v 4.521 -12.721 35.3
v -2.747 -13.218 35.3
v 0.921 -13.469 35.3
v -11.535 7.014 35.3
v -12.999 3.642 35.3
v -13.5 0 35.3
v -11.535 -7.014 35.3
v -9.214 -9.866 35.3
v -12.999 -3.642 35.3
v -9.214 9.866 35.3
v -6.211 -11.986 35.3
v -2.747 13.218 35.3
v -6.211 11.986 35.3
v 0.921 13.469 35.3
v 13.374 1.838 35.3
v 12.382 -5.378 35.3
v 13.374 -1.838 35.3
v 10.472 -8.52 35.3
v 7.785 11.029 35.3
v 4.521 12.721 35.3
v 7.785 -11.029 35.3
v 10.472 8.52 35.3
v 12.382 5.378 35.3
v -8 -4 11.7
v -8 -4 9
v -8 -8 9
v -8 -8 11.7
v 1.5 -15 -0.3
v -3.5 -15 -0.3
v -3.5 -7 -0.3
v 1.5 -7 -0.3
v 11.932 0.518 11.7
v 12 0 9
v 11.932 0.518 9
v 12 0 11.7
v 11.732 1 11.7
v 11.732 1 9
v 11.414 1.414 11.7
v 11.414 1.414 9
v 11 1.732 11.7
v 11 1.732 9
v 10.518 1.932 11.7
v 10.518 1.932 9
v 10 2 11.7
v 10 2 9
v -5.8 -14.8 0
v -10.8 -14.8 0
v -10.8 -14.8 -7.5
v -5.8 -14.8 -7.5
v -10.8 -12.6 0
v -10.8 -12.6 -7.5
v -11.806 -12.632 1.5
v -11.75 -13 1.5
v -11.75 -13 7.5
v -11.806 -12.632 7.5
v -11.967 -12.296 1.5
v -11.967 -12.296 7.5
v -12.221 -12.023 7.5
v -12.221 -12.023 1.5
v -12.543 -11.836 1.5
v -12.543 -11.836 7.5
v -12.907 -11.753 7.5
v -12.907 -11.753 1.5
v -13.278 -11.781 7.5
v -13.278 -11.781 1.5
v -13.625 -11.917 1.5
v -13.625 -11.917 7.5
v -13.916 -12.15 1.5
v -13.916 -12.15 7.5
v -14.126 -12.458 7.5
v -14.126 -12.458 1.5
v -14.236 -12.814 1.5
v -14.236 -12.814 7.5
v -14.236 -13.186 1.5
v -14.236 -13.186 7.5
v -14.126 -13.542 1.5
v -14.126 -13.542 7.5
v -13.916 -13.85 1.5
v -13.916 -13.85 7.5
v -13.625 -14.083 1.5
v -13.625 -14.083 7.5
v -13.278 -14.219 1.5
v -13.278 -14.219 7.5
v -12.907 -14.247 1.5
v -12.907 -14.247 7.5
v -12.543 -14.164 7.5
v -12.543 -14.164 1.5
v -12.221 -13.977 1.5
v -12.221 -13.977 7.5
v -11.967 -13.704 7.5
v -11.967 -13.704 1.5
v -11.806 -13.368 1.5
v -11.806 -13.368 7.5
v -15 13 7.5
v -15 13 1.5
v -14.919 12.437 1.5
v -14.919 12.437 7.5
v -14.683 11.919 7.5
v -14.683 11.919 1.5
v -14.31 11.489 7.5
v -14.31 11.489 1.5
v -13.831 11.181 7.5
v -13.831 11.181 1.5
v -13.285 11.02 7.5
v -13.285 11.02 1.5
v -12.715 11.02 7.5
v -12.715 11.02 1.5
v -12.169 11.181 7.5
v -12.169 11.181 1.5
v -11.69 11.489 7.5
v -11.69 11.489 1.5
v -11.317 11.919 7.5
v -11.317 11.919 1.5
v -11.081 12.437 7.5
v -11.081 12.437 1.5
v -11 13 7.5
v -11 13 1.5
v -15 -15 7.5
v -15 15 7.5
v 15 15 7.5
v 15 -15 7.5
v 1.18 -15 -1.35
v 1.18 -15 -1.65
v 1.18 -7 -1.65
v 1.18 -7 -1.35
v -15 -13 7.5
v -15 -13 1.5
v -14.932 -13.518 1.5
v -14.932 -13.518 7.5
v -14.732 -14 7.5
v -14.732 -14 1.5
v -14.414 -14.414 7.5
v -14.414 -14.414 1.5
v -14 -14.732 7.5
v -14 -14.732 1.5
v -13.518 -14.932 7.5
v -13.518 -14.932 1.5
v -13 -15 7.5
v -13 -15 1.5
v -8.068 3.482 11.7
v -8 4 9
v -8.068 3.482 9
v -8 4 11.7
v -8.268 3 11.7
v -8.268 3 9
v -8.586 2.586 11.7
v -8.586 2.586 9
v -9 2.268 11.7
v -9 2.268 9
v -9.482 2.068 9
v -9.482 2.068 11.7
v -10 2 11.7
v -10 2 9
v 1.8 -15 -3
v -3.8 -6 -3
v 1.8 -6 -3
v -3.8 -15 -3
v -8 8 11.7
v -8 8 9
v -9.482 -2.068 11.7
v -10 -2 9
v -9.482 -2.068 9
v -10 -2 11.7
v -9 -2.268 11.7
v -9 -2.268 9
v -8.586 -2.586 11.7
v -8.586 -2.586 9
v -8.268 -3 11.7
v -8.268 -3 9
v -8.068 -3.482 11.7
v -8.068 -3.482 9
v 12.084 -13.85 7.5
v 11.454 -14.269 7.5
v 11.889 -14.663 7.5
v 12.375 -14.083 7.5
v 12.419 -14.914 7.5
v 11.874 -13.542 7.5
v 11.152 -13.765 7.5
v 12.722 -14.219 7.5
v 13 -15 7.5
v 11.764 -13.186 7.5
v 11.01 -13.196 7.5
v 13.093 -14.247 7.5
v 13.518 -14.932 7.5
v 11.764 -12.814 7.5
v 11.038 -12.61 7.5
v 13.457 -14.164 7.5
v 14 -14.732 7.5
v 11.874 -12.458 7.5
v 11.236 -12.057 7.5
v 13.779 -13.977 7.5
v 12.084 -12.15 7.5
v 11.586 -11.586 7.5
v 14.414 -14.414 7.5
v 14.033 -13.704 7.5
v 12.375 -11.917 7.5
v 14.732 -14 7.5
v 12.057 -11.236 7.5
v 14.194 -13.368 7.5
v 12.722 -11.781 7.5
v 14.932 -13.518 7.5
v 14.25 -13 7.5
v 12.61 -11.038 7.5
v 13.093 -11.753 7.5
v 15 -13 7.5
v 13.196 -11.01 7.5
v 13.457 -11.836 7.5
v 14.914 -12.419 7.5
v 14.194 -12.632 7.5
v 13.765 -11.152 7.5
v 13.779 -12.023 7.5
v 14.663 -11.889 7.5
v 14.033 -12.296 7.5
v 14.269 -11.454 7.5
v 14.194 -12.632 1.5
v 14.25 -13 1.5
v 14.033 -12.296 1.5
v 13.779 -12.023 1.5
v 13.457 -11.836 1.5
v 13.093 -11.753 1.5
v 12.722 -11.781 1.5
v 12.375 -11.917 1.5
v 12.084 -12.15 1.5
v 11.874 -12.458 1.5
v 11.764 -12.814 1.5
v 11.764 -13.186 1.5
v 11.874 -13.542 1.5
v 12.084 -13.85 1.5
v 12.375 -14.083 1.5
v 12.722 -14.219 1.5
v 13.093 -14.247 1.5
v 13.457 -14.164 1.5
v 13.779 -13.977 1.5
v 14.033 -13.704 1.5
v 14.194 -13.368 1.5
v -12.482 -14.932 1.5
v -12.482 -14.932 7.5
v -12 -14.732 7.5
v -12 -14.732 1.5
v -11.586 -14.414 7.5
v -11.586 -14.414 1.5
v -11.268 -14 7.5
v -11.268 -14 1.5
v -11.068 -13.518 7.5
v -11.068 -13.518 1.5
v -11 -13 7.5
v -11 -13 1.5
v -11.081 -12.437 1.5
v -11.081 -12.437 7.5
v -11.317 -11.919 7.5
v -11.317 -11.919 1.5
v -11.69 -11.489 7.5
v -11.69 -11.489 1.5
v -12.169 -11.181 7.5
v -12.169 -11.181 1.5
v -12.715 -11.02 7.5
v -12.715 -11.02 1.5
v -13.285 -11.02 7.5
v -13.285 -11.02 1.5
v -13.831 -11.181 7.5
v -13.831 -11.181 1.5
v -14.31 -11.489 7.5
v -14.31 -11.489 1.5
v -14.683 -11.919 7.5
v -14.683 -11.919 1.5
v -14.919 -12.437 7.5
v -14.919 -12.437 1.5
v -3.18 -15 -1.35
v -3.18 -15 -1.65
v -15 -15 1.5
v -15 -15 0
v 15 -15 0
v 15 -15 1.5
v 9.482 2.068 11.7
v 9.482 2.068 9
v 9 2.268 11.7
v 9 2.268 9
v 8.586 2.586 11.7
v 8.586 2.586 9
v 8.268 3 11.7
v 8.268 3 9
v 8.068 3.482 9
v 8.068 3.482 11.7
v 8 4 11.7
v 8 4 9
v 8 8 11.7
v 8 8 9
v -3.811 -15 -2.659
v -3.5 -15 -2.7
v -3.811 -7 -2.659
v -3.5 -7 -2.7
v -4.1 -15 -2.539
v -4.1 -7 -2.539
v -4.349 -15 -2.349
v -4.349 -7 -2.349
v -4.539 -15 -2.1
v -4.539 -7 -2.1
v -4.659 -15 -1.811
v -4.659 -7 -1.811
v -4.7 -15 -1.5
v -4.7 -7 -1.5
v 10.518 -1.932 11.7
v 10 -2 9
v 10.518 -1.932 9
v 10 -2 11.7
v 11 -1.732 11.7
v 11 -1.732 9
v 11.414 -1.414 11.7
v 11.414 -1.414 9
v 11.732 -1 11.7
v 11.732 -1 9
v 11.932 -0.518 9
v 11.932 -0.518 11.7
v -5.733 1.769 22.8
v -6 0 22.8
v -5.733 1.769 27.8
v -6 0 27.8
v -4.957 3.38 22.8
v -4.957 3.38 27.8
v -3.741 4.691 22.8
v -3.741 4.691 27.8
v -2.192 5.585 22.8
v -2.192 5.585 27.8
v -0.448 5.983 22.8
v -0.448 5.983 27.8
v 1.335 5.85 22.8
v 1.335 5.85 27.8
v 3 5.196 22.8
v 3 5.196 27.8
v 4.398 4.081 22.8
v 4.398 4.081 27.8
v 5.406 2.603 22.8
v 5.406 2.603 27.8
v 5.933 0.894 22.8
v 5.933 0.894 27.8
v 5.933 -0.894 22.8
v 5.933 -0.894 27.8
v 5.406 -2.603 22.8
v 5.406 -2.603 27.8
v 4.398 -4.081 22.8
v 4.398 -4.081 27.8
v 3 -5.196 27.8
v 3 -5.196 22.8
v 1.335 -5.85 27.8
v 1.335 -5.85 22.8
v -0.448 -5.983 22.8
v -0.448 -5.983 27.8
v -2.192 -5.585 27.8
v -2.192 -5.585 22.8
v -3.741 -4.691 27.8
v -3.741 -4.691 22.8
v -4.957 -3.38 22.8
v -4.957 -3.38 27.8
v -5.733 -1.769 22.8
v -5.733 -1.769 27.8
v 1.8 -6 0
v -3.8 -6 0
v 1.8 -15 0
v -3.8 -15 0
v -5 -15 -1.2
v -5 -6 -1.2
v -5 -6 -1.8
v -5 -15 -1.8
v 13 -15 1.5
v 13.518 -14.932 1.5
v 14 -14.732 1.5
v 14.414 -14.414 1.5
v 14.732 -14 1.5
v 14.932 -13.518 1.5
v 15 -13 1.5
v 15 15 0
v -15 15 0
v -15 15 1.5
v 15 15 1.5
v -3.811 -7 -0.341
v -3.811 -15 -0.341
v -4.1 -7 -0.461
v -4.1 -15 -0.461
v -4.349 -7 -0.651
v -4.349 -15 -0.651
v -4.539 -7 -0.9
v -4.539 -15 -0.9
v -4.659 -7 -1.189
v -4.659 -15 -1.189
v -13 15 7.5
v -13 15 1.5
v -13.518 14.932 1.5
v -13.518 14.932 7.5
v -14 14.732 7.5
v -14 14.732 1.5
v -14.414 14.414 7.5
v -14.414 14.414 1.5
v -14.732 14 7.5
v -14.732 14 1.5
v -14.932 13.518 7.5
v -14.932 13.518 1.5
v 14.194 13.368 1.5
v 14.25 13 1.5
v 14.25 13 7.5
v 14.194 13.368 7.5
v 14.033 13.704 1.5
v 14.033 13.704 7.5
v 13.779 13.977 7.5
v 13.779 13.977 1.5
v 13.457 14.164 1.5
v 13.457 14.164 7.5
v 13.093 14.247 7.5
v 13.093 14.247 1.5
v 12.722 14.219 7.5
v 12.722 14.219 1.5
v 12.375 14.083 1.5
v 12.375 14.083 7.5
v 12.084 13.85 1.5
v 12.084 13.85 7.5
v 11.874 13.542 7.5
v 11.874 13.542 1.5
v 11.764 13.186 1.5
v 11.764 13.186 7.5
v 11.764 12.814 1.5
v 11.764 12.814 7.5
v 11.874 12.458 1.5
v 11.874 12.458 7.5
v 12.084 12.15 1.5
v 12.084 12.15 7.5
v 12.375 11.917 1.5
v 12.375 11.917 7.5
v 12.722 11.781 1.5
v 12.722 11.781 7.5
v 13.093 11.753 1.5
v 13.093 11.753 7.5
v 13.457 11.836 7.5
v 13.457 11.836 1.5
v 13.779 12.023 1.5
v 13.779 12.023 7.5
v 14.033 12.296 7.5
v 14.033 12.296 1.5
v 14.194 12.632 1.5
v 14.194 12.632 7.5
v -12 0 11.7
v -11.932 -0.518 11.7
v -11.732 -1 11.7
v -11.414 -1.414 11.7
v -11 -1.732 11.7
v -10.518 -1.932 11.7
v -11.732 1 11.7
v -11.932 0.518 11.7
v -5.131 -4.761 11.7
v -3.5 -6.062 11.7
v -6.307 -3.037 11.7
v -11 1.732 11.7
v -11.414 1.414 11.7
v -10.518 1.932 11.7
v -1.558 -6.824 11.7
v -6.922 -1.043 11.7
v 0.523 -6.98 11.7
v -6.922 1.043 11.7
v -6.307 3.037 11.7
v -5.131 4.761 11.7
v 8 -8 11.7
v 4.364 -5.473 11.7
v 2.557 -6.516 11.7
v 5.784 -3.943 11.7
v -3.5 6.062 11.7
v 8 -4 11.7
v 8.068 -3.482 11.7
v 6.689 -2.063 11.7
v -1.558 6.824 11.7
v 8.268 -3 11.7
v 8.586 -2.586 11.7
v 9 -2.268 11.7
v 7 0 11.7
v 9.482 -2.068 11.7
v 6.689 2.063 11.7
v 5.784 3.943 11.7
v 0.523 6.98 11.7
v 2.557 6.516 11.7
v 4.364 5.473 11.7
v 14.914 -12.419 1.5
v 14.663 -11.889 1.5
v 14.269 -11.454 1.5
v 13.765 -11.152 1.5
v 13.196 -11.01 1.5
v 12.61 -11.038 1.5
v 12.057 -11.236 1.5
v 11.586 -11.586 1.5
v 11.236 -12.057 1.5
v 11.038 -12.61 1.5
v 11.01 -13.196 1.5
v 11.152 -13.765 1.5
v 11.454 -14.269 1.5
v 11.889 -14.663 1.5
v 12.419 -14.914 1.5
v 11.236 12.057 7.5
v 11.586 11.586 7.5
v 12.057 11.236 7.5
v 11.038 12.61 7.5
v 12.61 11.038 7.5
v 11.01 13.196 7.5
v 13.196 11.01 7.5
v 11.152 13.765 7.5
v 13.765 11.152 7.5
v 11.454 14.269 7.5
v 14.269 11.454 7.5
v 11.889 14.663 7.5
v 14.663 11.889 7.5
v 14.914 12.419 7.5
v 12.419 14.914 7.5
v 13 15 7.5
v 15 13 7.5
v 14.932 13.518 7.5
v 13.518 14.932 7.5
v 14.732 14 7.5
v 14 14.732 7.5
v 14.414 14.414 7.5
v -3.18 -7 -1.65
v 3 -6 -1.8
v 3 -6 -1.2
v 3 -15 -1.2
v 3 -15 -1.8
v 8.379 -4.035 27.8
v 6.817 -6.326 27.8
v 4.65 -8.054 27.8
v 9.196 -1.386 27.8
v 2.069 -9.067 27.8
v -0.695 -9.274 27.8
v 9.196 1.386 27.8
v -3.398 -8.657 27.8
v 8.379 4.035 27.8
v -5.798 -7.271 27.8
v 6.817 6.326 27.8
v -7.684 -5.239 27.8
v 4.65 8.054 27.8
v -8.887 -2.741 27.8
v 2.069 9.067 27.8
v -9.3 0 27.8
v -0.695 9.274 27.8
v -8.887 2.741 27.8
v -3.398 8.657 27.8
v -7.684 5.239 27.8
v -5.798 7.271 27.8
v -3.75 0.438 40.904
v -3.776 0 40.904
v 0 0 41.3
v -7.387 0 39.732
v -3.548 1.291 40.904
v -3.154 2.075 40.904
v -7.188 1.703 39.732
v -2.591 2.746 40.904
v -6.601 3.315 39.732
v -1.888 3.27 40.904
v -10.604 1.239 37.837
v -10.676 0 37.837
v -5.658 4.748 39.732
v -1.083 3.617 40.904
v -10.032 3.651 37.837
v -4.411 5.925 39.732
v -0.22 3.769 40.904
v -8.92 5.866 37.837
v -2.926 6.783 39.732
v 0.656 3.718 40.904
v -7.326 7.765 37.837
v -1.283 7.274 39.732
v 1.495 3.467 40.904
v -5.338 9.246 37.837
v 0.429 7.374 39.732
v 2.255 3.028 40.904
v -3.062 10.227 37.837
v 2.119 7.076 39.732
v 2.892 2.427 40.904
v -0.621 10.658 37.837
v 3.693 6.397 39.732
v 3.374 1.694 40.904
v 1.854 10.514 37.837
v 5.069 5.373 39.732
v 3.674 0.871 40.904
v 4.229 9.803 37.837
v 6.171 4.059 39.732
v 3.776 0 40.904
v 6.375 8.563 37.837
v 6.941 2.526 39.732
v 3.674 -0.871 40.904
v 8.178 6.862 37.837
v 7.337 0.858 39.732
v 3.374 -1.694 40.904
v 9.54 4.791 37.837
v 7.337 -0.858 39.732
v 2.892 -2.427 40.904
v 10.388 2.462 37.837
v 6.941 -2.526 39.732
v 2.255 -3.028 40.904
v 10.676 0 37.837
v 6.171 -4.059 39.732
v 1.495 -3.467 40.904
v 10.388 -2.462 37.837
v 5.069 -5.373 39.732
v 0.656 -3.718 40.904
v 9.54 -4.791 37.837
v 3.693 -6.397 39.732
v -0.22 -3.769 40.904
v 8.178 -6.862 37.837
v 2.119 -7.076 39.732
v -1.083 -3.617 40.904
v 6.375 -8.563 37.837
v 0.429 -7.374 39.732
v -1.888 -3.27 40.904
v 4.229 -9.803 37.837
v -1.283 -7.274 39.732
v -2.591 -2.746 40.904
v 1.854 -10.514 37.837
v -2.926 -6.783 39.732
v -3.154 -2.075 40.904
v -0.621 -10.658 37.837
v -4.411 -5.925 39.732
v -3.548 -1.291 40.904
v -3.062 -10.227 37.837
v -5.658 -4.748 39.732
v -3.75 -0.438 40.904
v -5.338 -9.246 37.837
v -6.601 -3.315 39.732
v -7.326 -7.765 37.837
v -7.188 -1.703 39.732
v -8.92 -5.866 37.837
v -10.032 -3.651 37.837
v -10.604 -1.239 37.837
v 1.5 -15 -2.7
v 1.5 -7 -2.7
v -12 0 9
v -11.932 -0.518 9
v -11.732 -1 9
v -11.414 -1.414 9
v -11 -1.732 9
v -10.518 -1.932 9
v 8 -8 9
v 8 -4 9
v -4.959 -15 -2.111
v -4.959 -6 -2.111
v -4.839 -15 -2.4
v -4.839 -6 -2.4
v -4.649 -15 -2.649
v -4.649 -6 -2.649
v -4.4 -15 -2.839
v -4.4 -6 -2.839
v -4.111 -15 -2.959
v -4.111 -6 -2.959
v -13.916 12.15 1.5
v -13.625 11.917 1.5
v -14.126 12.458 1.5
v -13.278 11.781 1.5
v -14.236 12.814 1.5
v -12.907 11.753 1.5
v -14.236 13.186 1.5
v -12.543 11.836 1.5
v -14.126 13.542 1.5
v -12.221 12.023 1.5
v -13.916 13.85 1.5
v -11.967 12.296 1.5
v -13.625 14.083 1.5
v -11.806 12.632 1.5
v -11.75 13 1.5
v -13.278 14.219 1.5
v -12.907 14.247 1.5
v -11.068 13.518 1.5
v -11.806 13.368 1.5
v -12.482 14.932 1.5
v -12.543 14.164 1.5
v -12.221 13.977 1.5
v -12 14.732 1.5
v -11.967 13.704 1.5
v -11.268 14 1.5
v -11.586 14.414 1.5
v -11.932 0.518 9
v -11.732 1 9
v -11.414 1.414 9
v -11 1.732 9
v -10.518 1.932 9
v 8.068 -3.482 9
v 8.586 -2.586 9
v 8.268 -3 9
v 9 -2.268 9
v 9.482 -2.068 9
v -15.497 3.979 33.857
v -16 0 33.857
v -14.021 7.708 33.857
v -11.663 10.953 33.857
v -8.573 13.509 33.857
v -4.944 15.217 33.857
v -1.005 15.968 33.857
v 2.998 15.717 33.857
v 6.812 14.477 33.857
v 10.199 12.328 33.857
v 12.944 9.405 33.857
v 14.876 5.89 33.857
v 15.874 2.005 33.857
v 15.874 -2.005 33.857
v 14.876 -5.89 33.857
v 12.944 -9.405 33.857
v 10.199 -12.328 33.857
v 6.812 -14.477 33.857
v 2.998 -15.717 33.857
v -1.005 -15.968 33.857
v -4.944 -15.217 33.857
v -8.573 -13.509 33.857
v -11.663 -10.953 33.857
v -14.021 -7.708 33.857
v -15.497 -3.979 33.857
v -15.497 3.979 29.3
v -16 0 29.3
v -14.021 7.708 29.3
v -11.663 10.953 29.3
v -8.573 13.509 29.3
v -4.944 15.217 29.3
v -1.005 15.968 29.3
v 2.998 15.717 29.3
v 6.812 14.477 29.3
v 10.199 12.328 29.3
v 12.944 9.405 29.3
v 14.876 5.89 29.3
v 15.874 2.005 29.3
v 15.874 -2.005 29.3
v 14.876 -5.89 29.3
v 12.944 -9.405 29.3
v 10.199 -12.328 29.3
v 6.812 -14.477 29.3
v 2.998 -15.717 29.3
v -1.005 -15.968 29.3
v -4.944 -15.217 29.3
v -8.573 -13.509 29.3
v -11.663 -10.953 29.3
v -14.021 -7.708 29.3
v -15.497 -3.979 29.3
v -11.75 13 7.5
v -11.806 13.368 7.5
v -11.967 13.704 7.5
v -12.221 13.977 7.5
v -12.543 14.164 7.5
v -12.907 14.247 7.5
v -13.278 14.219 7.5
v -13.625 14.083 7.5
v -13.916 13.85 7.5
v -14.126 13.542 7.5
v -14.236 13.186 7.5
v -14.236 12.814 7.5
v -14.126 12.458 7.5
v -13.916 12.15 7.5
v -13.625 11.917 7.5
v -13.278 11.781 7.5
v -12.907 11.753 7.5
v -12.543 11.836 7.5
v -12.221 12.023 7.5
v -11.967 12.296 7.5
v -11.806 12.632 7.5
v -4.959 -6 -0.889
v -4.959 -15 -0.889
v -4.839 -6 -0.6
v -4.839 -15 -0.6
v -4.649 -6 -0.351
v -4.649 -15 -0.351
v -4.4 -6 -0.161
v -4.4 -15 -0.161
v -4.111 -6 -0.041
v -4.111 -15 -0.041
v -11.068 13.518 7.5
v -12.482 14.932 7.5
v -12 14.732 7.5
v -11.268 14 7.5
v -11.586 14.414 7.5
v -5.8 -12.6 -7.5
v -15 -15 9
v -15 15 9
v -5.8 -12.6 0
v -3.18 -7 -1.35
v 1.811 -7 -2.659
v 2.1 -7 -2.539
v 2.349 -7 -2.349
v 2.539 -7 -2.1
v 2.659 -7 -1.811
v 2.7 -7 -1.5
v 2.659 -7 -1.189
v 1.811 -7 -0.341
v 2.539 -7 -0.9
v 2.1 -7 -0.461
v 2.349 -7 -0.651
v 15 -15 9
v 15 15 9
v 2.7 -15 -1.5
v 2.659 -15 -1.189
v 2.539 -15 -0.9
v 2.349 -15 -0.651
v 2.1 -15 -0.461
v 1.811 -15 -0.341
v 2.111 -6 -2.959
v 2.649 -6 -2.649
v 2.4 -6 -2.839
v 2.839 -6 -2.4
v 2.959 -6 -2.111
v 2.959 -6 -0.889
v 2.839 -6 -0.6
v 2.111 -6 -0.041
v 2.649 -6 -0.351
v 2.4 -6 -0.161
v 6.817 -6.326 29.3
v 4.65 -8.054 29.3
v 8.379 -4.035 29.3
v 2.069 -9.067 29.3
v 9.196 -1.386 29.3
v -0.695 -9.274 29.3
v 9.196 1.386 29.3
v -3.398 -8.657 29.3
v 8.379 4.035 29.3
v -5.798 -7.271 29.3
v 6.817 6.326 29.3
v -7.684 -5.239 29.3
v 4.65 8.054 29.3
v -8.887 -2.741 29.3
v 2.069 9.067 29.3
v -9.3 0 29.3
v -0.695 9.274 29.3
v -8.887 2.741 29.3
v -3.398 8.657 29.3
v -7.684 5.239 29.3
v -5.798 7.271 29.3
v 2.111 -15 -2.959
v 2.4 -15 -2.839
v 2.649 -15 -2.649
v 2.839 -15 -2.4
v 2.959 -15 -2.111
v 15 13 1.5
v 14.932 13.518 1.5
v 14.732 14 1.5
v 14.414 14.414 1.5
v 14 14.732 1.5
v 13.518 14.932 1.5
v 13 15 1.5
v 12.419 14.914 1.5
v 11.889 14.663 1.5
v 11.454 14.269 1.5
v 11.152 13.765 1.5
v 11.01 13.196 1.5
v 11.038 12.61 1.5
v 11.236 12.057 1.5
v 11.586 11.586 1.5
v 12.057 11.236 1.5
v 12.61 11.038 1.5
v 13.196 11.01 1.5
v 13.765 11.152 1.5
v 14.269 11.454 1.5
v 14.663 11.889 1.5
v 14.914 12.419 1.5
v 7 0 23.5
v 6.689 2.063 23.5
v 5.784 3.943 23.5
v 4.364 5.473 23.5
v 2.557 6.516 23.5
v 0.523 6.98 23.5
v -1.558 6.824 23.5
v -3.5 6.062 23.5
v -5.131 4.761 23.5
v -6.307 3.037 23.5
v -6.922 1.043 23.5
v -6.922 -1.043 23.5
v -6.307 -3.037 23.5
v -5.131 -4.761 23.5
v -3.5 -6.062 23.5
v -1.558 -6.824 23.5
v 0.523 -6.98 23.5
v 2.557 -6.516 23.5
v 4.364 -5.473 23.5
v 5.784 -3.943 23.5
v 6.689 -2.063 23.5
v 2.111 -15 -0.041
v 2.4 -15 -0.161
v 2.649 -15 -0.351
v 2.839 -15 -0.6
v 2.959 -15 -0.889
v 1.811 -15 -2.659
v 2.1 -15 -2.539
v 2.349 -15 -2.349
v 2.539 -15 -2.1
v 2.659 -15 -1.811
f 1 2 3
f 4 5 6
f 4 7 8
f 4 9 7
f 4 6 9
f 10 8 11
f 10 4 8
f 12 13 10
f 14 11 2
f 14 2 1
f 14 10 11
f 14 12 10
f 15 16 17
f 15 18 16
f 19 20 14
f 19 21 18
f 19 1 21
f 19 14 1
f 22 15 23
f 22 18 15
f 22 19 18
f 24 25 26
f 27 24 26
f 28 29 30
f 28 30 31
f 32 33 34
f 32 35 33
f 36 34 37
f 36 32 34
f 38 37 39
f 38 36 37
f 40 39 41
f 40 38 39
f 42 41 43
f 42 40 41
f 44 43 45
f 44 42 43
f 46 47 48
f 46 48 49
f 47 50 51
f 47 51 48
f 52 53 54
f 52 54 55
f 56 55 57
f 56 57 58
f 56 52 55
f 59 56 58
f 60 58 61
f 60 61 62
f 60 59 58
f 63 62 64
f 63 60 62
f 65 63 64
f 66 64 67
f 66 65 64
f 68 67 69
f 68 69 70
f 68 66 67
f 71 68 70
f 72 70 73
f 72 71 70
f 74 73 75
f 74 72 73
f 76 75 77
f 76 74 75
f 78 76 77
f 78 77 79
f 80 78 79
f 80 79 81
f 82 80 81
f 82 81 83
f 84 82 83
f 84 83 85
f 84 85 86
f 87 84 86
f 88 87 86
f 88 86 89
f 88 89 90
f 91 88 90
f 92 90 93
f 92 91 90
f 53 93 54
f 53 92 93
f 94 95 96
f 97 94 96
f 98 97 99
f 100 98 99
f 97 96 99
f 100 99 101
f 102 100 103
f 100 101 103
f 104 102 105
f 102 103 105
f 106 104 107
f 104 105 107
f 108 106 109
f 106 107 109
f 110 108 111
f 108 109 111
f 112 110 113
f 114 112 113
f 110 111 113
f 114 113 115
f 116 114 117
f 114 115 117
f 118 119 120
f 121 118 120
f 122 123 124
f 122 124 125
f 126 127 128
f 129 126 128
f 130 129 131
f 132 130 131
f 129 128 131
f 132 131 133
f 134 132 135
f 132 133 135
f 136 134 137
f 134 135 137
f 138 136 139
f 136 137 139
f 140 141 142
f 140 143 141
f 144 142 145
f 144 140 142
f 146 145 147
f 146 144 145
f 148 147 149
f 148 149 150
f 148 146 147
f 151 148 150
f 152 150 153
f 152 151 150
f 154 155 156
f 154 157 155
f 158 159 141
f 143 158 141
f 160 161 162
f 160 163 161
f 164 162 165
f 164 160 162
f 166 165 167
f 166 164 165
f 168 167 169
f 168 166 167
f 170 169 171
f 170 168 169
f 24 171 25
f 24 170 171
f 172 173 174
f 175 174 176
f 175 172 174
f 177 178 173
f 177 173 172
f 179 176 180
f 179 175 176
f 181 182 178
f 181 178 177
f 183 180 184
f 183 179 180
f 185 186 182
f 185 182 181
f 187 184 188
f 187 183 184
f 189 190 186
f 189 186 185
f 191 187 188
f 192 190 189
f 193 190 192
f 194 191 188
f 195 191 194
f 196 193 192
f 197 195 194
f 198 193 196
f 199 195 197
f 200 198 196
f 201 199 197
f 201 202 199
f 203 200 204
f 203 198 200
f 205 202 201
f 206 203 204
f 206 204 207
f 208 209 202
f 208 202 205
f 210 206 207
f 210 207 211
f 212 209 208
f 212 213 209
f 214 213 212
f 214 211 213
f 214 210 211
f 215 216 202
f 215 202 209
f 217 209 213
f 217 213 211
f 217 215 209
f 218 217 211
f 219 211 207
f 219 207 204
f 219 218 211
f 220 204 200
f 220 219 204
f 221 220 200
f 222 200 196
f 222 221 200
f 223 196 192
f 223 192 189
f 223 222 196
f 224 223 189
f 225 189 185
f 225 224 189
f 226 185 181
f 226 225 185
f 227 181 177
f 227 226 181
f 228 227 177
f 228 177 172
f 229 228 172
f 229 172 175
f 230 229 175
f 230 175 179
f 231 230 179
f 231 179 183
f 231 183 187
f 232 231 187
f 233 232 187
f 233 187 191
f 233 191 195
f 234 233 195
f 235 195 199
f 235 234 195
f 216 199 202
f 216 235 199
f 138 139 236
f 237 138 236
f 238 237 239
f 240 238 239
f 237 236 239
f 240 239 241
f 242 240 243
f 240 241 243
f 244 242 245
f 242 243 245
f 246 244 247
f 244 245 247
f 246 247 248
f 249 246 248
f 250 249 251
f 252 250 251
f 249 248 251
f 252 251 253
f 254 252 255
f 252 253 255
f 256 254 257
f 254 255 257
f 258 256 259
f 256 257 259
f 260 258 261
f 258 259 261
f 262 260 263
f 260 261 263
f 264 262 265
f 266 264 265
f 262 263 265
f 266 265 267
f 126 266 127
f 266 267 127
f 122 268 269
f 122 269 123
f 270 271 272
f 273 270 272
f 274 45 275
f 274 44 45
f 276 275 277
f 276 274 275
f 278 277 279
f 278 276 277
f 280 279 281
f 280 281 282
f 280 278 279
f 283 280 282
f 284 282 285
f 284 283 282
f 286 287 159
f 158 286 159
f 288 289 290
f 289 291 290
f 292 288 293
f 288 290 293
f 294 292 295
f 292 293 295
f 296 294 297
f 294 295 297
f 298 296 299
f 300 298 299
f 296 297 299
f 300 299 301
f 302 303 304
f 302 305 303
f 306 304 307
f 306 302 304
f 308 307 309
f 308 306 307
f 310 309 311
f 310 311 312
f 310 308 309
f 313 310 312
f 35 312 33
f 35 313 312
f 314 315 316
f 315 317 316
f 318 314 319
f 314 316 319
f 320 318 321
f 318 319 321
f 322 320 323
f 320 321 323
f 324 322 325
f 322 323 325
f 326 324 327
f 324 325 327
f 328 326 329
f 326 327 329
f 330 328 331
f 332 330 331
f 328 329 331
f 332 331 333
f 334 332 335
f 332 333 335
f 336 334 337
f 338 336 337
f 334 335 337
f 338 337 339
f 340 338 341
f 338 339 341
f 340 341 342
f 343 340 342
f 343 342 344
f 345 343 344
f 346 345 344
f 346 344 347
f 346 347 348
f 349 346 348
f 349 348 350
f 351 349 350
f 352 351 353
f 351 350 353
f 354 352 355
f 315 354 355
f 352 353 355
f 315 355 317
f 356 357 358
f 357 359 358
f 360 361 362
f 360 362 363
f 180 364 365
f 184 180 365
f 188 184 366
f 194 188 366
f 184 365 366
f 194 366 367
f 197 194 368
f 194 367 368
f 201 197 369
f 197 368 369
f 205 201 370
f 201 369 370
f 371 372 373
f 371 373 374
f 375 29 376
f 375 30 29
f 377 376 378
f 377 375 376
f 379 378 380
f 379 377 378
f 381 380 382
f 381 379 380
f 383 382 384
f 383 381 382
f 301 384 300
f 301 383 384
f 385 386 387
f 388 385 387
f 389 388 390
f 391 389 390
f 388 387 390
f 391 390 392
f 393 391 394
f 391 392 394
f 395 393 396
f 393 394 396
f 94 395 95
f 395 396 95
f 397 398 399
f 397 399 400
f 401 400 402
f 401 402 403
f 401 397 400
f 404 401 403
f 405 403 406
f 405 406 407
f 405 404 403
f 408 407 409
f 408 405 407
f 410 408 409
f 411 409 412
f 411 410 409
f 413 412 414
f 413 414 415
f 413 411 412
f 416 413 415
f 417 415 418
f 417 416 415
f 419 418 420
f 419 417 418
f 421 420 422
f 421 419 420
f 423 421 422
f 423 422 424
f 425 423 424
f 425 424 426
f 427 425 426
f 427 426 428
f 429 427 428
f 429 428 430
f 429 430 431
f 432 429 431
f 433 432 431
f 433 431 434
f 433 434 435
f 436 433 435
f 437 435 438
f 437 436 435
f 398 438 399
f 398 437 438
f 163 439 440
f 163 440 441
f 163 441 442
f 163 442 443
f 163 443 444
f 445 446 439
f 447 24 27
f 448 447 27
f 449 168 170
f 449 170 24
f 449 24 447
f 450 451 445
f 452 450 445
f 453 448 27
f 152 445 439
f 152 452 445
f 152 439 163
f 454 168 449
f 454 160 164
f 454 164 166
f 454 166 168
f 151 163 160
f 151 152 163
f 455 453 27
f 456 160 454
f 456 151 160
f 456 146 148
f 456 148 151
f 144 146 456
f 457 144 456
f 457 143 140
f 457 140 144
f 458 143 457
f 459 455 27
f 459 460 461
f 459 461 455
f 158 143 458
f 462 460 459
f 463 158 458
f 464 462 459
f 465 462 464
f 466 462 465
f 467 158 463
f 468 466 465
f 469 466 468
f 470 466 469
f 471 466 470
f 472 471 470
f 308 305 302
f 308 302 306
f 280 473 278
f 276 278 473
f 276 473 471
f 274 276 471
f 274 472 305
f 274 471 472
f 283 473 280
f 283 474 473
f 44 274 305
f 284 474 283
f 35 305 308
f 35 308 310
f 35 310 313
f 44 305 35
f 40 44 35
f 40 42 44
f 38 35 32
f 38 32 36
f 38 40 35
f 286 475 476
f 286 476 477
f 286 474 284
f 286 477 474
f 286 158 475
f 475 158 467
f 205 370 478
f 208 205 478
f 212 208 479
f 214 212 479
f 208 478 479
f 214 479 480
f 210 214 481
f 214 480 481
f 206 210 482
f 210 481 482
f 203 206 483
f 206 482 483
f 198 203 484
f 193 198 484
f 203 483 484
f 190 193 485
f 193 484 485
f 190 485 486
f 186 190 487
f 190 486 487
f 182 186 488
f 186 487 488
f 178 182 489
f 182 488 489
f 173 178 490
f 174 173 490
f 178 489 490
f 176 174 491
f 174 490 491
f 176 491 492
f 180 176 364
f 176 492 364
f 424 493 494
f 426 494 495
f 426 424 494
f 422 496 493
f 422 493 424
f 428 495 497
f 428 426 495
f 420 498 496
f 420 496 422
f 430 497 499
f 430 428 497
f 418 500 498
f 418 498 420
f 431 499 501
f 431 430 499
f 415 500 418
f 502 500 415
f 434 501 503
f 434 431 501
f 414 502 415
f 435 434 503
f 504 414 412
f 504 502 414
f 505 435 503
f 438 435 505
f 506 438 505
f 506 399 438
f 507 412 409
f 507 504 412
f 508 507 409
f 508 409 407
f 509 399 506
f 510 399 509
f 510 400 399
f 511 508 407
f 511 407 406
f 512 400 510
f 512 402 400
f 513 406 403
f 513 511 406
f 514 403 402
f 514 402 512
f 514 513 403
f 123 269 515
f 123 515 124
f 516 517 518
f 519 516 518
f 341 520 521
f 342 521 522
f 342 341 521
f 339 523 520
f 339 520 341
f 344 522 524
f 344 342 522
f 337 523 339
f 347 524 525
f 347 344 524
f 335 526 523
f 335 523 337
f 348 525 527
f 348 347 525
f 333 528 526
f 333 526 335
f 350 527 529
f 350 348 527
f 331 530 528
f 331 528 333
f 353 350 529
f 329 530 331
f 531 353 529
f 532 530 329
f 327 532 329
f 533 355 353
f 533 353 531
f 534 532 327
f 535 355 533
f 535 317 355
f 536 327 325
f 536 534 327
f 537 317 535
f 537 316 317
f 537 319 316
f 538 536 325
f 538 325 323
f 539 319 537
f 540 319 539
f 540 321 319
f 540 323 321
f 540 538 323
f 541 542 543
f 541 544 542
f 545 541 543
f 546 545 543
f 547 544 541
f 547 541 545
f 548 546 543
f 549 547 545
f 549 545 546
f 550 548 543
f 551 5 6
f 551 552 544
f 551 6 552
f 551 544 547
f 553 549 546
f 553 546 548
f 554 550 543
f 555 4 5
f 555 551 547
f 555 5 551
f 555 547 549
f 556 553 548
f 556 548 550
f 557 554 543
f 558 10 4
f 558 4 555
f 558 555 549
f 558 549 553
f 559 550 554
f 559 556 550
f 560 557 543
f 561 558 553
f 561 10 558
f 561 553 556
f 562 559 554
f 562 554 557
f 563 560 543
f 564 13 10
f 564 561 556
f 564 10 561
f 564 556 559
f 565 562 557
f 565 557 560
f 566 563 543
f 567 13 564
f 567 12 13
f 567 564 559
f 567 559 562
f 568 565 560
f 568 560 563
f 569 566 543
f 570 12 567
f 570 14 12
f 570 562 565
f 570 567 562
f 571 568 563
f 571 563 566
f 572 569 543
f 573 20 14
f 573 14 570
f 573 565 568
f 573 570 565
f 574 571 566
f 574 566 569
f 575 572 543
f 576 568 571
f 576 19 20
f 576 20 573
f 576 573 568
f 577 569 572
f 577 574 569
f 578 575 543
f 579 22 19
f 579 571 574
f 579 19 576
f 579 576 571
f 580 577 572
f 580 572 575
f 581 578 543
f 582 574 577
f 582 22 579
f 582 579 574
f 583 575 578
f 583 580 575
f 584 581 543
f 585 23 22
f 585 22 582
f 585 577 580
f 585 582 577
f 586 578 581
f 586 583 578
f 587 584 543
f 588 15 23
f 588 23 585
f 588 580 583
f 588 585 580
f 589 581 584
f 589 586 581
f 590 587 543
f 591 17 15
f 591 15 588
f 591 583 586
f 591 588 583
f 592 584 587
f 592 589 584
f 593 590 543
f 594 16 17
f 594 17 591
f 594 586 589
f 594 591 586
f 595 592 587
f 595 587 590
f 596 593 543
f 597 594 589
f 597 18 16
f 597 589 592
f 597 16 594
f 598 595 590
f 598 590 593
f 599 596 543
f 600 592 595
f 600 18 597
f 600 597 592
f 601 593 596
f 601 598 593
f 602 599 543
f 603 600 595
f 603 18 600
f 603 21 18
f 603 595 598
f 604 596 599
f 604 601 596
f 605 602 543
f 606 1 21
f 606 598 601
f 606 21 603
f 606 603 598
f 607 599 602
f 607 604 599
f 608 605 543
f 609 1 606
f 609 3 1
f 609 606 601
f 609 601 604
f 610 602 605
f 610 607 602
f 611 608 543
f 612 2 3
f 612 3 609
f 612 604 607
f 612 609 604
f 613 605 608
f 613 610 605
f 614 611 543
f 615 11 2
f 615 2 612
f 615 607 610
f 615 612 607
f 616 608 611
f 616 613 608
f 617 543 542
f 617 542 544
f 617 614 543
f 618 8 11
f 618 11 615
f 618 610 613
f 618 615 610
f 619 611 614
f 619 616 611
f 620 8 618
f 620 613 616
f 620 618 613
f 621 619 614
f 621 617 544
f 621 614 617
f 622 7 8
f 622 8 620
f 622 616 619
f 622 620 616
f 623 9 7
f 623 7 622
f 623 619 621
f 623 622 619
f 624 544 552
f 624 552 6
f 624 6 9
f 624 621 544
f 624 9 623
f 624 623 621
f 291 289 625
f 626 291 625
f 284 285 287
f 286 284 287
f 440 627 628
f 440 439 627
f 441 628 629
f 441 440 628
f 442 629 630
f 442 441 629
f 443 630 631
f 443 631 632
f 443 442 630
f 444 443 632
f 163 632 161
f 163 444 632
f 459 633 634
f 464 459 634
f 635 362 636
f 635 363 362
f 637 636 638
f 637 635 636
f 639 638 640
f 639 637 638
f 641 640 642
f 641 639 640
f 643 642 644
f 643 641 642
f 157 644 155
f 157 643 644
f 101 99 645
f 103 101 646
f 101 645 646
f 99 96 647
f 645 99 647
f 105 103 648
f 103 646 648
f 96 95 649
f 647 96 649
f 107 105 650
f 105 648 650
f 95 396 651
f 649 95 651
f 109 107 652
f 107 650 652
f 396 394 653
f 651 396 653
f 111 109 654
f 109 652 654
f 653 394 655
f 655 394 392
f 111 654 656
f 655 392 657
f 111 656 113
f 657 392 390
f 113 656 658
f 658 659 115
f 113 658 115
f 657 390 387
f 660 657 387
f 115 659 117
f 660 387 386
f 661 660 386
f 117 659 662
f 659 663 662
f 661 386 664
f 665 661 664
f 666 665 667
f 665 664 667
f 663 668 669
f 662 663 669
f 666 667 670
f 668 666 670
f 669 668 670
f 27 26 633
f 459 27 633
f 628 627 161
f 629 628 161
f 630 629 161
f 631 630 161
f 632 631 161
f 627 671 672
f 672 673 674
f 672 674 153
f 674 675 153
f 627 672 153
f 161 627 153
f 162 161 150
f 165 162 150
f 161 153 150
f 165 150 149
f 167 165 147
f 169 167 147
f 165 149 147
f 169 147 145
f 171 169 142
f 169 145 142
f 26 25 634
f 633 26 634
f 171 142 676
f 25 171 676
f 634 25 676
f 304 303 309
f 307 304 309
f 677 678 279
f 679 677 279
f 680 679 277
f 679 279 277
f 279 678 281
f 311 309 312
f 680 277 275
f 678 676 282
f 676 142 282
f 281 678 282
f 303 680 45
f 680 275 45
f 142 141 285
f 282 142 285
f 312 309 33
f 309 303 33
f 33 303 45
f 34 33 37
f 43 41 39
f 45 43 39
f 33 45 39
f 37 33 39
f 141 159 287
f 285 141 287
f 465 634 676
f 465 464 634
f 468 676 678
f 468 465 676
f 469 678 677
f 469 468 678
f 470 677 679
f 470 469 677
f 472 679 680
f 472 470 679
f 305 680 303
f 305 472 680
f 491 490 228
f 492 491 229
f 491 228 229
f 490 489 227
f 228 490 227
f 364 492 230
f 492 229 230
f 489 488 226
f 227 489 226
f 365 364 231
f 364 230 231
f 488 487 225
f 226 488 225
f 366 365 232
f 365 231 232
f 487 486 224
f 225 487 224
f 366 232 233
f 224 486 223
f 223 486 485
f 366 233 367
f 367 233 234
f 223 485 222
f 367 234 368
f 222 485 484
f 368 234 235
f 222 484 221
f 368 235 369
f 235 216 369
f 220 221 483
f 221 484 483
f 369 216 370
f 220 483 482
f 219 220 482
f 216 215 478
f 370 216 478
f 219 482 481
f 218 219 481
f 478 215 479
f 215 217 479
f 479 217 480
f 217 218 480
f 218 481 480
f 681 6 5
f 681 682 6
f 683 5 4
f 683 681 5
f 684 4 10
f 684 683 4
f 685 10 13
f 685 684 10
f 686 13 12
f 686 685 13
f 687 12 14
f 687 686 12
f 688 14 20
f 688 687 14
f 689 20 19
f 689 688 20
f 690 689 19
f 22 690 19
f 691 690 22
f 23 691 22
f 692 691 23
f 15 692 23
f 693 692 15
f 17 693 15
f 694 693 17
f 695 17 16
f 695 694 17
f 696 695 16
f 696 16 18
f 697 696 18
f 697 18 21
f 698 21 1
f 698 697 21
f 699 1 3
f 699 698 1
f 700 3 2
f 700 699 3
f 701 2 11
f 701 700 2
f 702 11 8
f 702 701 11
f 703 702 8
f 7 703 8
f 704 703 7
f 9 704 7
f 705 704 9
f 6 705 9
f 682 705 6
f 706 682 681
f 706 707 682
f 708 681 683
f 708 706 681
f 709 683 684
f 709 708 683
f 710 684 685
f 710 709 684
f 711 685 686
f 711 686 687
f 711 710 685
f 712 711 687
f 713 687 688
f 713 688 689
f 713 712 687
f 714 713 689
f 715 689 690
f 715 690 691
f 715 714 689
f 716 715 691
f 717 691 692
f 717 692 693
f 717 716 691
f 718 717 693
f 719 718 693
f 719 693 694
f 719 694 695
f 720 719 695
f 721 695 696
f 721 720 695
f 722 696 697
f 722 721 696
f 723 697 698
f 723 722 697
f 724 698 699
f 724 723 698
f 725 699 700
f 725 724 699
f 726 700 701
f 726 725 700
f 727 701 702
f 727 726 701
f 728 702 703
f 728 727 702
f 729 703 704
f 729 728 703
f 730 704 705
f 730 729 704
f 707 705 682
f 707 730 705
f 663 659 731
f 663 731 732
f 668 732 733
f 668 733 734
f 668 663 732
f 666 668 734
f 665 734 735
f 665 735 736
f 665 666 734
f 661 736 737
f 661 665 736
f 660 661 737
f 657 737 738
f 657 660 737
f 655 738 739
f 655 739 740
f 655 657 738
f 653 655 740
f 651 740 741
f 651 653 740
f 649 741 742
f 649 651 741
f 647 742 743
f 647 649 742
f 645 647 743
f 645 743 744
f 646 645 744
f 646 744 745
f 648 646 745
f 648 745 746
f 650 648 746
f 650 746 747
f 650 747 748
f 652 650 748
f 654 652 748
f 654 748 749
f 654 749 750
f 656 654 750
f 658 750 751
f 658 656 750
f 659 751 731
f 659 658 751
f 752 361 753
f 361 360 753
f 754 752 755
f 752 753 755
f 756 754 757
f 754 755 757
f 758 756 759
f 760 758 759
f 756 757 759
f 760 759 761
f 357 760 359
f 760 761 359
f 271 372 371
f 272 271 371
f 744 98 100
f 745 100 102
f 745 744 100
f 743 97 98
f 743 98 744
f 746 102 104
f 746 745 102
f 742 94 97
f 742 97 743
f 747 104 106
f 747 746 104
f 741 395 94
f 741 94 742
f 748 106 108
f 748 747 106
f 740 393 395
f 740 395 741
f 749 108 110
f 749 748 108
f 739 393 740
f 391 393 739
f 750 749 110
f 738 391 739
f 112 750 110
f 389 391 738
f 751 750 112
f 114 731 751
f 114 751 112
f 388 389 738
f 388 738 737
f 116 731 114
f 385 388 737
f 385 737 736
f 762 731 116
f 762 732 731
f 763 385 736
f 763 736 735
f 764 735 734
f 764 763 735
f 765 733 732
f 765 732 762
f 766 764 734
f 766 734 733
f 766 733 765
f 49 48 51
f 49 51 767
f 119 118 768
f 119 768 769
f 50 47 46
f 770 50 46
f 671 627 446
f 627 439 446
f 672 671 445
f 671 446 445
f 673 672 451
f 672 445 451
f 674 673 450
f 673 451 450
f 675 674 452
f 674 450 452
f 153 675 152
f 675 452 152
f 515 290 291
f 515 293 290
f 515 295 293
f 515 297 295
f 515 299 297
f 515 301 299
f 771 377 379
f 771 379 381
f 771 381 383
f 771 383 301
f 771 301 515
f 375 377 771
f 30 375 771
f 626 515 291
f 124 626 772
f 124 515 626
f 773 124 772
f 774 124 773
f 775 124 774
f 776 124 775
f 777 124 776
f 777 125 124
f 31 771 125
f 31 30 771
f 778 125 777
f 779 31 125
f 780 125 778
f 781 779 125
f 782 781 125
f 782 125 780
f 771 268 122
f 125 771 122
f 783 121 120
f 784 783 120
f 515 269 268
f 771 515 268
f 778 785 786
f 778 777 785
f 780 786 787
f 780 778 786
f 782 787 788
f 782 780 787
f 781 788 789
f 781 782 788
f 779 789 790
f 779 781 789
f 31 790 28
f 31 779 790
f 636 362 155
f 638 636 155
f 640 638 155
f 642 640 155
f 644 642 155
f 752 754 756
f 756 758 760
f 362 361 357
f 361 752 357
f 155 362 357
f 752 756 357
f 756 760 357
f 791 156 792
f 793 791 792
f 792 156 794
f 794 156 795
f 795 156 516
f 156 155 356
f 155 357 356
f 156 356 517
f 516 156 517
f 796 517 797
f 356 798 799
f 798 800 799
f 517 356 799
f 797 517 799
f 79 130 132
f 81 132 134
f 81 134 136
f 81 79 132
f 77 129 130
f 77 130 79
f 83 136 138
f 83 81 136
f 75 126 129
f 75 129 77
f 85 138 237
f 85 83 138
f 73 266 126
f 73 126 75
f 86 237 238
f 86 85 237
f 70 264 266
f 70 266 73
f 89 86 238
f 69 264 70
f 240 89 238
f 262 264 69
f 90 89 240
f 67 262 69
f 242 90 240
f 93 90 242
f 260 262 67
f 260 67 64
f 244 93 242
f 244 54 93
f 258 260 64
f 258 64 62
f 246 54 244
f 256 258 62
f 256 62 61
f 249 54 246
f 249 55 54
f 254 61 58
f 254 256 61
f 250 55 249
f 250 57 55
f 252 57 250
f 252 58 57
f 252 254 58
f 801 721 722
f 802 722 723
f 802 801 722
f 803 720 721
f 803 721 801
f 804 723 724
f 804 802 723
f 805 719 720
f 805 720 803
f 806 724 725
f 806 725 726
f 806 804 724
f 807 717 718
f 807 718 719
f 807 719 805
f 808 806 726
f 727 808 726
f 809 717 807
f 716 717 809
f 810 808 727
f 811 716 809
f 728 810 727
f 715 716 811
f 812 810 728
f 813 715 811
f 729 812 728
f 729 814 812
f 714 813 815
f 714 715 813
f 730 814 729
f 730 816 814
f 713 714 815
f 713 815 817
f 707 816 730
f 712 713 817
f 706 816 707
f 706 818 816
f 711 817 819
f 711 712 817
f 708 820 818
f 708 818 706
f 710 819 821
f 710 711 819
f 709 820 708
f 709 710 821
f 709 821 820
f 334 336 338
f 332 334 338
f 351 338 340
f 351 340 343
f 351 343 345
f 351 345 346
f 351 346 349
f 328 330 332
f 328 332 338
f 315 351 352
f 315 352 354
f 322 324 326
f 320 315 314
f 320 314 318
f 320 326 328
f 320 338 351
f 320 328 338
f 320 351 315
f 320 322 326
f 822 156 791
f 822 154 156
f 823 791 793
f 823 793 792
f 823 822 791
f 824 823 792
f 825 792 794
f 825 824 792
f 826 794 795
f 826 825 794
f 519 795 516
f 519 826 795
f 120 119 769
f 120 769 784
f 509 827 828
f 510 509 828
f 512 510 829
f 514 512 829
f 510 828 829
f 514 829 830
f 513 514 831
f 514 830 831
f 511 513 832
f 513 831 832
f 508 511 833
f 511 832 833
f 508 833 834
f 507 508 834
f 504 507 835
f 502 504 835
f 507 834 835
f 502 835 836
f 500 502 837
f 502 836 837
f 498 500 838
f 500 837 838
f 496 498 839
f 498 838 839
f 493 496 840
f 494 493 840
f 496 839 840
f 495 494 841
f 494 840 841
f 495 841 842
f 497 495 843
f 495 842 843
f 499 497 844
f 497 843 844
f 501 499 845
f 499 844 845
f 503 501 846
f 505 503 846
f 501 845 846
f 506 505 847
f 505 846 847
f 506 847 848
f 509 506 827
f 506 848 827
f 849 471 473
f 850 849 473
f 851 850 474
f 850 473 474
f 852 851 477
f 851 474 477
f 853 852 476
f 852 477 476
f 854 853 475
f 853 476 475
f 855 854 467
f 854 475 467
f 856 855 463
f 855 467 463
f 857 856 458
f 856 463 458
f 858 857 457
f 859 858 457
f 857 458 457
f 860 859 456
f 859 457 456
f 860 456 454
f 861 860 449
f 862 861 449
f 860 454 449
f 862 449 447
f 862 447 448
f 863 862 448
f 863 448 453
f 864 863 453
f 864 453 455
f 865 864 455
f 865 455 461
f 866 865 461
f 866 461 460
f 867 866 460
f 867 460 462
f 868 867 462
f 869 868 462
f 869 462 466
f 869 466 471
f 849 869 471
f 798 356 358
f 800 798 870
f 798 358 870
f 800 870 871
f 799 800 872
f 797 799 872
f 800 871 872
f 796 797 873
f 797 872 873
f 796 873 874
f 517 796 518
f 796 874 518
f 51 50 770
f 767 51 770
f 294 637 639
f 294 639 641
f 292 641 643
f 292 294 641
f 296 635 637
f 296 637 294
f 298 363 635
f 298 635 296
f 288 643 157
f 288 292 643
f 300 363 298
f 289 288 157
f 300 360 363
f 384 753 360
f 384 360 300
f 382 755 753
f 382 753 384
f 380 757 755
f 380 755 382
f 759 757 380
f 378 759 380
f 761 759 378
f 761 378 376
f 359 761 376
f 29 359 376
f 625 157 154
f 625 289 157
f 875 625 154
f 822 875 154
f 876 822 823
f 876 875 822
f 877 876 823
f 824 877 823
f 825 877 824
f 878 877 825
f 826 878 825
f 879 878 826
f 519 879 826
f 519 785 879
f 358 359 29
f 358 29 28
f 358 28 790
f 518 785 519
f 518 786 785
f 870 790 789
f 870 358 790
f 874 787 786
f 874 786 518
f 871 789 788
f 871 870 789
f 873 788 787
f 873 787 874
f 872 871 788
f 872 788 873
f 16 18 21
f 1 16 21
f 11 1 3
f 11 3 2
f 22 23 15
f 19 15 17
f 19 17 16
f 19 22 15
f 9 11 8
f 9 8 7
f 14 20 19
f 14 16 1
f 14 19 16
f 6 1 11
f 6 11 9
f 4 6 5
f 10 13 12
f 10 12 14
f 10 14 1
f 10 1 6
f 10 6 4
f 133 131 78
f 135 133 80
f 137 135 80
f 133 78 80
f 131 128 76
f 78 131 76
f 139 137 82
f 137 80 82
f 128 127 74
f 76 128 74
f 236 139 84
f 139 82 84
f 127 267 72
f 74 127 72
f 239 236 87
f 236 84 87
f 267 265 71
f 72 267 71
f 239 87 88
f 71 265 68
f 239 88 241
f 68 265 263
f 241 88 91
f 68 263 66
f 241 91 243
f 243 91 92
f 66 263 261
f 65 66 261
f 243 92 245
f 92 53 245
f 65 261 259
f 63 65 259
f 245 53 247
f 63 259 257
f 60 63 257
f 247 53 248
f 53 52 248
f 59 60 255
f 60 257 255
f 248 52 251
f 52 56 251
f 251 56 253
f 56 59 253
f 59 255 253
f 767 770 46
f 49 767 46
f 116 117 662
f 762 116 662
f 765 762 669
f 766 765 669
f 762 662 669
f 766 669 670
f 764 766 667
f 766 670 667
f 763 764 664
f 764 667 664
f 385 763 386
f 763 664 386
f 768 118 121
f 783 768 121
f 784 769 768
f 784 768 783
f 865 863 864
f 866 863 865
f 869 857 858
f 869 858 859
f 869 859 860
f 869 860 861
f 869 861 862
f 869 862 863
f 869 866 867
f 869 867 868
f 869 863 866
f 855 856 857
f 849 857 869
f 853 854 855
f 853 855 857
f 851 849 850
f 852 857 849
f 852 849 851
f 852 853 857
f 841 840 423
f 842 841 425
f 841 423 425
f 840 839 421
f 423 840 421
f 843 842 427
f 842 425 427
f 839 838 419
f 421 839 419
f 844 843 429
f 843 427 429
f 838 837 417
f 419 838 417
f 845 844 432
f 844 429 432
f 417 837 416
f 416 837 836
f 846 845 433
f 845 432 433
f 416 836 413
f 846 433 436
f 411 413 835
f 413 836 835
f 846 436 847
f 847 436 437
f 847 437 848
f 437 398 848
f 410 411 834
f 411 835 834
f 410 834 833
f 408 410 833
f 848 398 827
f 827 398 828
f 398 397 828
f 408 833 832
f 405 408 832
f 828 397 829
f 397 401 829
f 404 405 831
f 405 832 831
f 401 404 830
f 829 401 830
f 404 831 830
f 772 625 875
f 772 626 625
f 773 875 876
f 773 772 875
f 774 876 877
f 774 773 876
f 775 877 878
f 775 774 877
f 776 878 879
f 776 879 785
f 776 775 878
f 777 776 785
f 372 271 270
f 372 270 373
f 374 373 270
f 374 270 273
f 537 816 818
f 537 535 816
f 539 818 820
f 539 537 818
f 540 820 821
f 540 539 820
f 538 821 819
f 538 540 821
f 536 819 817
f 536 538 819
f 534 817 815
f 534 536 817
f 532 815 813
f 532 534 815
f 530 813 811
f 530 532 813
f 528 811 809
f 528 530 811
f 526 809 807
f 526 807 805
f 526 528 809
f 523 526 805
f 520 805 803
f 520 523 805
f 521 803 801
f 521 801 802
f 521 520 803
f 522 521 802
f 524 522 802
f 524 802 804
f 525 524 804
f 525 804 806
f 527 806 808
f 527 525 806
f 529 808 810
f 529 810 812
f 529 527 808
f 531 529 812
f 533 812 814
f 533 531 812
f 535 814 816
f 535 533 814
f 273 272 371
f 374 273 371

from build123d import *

# Parameters (mm, degrees)
F0_W      = 30
F0_H      = 30
F1_DEPTH  = 1.5
F2_START  = 6
F1_FACE_W = 30
F1_FACE_H = 30
F2_DEPTH  = 1.5
F3_R      = 1.25
F4_DEPTH  = 6
F5_W      = 4
F5_H      = 4
F5_R      = 7
F6_DEPTH  = 2.7
F7_R      = 1.99999
F8_DEPTH  = 14.5
F9_W      = 6
F9_H      = 5
F12_W     = 8
F12_H     = 9
F13_DEPTH = 3
F14_W     = 7.4
F14_H     = 2.4
F14_W_2   = 4.36
F14_H_2   = 0.3
F15_DEPTH = 8
F16_R     = 1.19999
F17_W     = 5
F17_H     = 2.2
F18_DEPTH = 7.5


# Not quite as in the source:
# - a fillet or chamfer is up to 0.001 mm smaller than in the source, because OpenCascade refuses the exact size


with BuildPart() as f1:
    # F0 (on Top) → F1 (new body)
    with BuildSketch(Plane.XY):
        Rectangle(F0_W, F0_H)
    extrude(amount=F1_DEPTH)


with BuildPart() as f2:
    # F1_face (on face) → F2 (new body)
    with BuildSketch(Plane.XY.offset(1.5).offset(F2_START)):
        Rectangle(F1_FACE_W, F1_FACE_H)
    extrude(amount=F2_DEPTH)


with BuildPart() as f4:
    # F3 (on face) → F4 (new body)
    with BuildSketch(Plane.XY.offset(1.5)):
        with BuildLine():
            ThreePointArc((-11, 13), (-11.5857864376, 14.4142135624), (-13, 15))
            ThreePointArc((-13, 15), (-14.4142135624, 14.4142135624), (-15, 13))
            ThreePointArc((-15, 13), (-13, 11), (-11, 13))
        make_face()
        with Locations((-13, 13)):
            Circle(F3_R, mode=Mode.SUBTRACT)
    extrude(amount=F4_DEPTH)


with BuildPart() as f4b:
    # F3 (on face) → F4, piece 2 (new body)
    with BuildSketch(Plane.XY.offset(1.5)):
        with BuildLine():
            ThreePointArc((-15, -13), (-14.4142135624, -14.4142135624), (-13, -15))
            ThreePointArc((-13, -15), (-11.5857864376, -14.4142135624), (-11, -13))
            ThreePointArc((-11, -13), (-13, -11), (-15, -13))
        make_face()
        with Locations((-13, -13)):
            Circle(F3_R, mode=Mode.SUBTRACT)
    extrude(amount=F4_DEPTH)


with BuildPart() as f4c:
    # F3 (on face) → F4, piece 3 (new body)
    with BuildSketch(Plane.XY.offset(1.5)):
        with BuildLine():
            ThreePointArc((13, -15), (14.4142135624, -14.4142135624), (15, -13))
            ThreePointArc((15, -13), (11.5857864376, -11.5857864376), (13, -15))
        make_face()
        with Locations((13, -13)):
            Circle(F3_R, mode=Mode.SUBTRACT)
    extrude(amount=F4_DEPTH)


with BuildPart() as f4d:
    # F3 (on face) → F4, piece 4 (new body)
    with BuildSketch(Plane.XY.offset(1.5)):
        with BuildLine():
            ThreePointArc((13, 15), (11.5857864376, 11.5857864376), (15, 13))
            ThreePointArc((15, 13), (14.4142135624, 14.4142135624), (13, 15))
        make_face()
        with Locations((13, 13)):
            Circle(F3_R, mode=Mode.SUBTRACT)
    extrude(amount=F4_DEPTH)


with BuildPart() as f6:
    # F5 (on face) → F6 (new body)
    with BuildSketch(Plane.XY.offset(9)):
        with Locations((-10, 0)):
            Rectangle(F5_W, F5_H)
        Polygon((-8, -8), (8, -8), (8, -2), (8, 2), (8, 8), (-8, 8), (-8, 2), (-8, -2), align=None)
        Circle(F5_R, mode=Mode.SUBTRACT)
        with Locations((10, 0)):
            Rectangle(F5_W, F5_H)
        Circle(F5_R)
    extrude(amount=F6_DEPTH)

    # F7 (radius 2 in the source; OpenCascade refuses exactly that, so slightly less here)
    f7_edges = [f6.edges().sort_by_distance(p)[0] for p in [
        (-12, 2, 10.35),
        (-12, -2, 10.35),
        (-8, 2, 10.35),
        (-8, -2, 10.35),
        (12, -2, 10.35),
        (8, -2, 10.35),
        (8, 2, 10.35),
        (12, 2, 10.35),
    ]]
    fillet(f7_edges, radius=F7_R)

    # F5 (on face) → F8 (join)
    with BuildSketch(Plane.XY.offset(9)):
        Circle(F5_R)
    extrude(amount=F8_DEPTH)


with BuildPart() as f10:
    # F9 (on Front) → F10 (revolve)
    with BuildSketch(Plane.XZ):
        with BuildLine():
            Line((-13.5, 35.3), (0, 35.3))
            Line((0, 35.3), (0, 41.3))
            ThreePointArc((0, 41.3), (-7.3866433513, 39.7324475405), (-13.5, 35.3))
        make_face()
    revolve(axis=Axis((0, 0, 25.3), (0, 0, -1)))


with BuildPart() as f11:
    # F9 (on Front) → F11 (revolve)
    with BuildSketch(Plane.XZ):
        Polygon((-9.3, 29.3), (0, 29.3), (0, 35.3), (-13.5, 35.3), (-16, 33.856624327), (-16, 29.3), align=None)
        Polygon((-6, 27.8), (0, 27.8), (0, 29.3), (-9.3, 29.3), (-9.3, 27.8), align=None)
        with Locations((-3, 25.3)):
            Rectangle(F9_W, F9_H)
    revolve(axis=Axis((0, 0, 25.3), (0, 0, -1)))


with BuildPart() as f13:
    # F12 (on face) → F13 (new body)
    with BuildSketch(Plane(origin=(0, 0, 0), x_dir=(1, 0, 0), z_dir=(0, 0, -1))):
        with Locations((-1, 10.5)):
            Rectangle(F12_W, F12_H)
    extrude(amount=F13_DEPTH)

    # F14 (on face) → F15 (cut)
    with BuildSketch(Plane.XZ.offset(15)):
        with Locations((-1, -1.5)):
            Rectangle(F14_W, F14_H)
        with Locations((-1, -1.5)):
            Rectangle(F14_W_2, F14_H_2, mode=Mode.SUBTRACT)
    extrude(amount=-F15_DEPTH, mode=Mode.SUBTRACT)

    # F16 (radius 1.2 in the source; OpenCascade refuses exactly that, so slightly less here)
    f16_edges = [f13.edges().sort_by_distance(p)[0] for p in [
        (-5, -10.5, -3),
        (-5, -10.5, 0),
        (3, -10.5, 0),
        (3, -10.5, -3),
        (-4.7, -11, -0.3),
        (2.7, -11, -0.3),
        (2.7, -11, -2.7),
        (-4.7, -11, -2.7),
    ]]
    fillet(f16_edges, radius=F16_R)


with BuildPart() as f18:
    # F17 (on face) → F18 (new body)
    with BuildSketch(Plane(origin=(0, 0, 0), x_dir=(1, 0, 0), z_dir=(0, 0, -1))):
        with Locations((-8.3, 13.7)):
            Rectangle(F17_W, F17_H)
    extrude(amount=F18_DEPTH)


solid = Compound([f1.part, f2.part, f4.part, f4b.part, f4c.part, f4d.part, f6.part, f10.part, f11.part, f13.part, f18.part])
